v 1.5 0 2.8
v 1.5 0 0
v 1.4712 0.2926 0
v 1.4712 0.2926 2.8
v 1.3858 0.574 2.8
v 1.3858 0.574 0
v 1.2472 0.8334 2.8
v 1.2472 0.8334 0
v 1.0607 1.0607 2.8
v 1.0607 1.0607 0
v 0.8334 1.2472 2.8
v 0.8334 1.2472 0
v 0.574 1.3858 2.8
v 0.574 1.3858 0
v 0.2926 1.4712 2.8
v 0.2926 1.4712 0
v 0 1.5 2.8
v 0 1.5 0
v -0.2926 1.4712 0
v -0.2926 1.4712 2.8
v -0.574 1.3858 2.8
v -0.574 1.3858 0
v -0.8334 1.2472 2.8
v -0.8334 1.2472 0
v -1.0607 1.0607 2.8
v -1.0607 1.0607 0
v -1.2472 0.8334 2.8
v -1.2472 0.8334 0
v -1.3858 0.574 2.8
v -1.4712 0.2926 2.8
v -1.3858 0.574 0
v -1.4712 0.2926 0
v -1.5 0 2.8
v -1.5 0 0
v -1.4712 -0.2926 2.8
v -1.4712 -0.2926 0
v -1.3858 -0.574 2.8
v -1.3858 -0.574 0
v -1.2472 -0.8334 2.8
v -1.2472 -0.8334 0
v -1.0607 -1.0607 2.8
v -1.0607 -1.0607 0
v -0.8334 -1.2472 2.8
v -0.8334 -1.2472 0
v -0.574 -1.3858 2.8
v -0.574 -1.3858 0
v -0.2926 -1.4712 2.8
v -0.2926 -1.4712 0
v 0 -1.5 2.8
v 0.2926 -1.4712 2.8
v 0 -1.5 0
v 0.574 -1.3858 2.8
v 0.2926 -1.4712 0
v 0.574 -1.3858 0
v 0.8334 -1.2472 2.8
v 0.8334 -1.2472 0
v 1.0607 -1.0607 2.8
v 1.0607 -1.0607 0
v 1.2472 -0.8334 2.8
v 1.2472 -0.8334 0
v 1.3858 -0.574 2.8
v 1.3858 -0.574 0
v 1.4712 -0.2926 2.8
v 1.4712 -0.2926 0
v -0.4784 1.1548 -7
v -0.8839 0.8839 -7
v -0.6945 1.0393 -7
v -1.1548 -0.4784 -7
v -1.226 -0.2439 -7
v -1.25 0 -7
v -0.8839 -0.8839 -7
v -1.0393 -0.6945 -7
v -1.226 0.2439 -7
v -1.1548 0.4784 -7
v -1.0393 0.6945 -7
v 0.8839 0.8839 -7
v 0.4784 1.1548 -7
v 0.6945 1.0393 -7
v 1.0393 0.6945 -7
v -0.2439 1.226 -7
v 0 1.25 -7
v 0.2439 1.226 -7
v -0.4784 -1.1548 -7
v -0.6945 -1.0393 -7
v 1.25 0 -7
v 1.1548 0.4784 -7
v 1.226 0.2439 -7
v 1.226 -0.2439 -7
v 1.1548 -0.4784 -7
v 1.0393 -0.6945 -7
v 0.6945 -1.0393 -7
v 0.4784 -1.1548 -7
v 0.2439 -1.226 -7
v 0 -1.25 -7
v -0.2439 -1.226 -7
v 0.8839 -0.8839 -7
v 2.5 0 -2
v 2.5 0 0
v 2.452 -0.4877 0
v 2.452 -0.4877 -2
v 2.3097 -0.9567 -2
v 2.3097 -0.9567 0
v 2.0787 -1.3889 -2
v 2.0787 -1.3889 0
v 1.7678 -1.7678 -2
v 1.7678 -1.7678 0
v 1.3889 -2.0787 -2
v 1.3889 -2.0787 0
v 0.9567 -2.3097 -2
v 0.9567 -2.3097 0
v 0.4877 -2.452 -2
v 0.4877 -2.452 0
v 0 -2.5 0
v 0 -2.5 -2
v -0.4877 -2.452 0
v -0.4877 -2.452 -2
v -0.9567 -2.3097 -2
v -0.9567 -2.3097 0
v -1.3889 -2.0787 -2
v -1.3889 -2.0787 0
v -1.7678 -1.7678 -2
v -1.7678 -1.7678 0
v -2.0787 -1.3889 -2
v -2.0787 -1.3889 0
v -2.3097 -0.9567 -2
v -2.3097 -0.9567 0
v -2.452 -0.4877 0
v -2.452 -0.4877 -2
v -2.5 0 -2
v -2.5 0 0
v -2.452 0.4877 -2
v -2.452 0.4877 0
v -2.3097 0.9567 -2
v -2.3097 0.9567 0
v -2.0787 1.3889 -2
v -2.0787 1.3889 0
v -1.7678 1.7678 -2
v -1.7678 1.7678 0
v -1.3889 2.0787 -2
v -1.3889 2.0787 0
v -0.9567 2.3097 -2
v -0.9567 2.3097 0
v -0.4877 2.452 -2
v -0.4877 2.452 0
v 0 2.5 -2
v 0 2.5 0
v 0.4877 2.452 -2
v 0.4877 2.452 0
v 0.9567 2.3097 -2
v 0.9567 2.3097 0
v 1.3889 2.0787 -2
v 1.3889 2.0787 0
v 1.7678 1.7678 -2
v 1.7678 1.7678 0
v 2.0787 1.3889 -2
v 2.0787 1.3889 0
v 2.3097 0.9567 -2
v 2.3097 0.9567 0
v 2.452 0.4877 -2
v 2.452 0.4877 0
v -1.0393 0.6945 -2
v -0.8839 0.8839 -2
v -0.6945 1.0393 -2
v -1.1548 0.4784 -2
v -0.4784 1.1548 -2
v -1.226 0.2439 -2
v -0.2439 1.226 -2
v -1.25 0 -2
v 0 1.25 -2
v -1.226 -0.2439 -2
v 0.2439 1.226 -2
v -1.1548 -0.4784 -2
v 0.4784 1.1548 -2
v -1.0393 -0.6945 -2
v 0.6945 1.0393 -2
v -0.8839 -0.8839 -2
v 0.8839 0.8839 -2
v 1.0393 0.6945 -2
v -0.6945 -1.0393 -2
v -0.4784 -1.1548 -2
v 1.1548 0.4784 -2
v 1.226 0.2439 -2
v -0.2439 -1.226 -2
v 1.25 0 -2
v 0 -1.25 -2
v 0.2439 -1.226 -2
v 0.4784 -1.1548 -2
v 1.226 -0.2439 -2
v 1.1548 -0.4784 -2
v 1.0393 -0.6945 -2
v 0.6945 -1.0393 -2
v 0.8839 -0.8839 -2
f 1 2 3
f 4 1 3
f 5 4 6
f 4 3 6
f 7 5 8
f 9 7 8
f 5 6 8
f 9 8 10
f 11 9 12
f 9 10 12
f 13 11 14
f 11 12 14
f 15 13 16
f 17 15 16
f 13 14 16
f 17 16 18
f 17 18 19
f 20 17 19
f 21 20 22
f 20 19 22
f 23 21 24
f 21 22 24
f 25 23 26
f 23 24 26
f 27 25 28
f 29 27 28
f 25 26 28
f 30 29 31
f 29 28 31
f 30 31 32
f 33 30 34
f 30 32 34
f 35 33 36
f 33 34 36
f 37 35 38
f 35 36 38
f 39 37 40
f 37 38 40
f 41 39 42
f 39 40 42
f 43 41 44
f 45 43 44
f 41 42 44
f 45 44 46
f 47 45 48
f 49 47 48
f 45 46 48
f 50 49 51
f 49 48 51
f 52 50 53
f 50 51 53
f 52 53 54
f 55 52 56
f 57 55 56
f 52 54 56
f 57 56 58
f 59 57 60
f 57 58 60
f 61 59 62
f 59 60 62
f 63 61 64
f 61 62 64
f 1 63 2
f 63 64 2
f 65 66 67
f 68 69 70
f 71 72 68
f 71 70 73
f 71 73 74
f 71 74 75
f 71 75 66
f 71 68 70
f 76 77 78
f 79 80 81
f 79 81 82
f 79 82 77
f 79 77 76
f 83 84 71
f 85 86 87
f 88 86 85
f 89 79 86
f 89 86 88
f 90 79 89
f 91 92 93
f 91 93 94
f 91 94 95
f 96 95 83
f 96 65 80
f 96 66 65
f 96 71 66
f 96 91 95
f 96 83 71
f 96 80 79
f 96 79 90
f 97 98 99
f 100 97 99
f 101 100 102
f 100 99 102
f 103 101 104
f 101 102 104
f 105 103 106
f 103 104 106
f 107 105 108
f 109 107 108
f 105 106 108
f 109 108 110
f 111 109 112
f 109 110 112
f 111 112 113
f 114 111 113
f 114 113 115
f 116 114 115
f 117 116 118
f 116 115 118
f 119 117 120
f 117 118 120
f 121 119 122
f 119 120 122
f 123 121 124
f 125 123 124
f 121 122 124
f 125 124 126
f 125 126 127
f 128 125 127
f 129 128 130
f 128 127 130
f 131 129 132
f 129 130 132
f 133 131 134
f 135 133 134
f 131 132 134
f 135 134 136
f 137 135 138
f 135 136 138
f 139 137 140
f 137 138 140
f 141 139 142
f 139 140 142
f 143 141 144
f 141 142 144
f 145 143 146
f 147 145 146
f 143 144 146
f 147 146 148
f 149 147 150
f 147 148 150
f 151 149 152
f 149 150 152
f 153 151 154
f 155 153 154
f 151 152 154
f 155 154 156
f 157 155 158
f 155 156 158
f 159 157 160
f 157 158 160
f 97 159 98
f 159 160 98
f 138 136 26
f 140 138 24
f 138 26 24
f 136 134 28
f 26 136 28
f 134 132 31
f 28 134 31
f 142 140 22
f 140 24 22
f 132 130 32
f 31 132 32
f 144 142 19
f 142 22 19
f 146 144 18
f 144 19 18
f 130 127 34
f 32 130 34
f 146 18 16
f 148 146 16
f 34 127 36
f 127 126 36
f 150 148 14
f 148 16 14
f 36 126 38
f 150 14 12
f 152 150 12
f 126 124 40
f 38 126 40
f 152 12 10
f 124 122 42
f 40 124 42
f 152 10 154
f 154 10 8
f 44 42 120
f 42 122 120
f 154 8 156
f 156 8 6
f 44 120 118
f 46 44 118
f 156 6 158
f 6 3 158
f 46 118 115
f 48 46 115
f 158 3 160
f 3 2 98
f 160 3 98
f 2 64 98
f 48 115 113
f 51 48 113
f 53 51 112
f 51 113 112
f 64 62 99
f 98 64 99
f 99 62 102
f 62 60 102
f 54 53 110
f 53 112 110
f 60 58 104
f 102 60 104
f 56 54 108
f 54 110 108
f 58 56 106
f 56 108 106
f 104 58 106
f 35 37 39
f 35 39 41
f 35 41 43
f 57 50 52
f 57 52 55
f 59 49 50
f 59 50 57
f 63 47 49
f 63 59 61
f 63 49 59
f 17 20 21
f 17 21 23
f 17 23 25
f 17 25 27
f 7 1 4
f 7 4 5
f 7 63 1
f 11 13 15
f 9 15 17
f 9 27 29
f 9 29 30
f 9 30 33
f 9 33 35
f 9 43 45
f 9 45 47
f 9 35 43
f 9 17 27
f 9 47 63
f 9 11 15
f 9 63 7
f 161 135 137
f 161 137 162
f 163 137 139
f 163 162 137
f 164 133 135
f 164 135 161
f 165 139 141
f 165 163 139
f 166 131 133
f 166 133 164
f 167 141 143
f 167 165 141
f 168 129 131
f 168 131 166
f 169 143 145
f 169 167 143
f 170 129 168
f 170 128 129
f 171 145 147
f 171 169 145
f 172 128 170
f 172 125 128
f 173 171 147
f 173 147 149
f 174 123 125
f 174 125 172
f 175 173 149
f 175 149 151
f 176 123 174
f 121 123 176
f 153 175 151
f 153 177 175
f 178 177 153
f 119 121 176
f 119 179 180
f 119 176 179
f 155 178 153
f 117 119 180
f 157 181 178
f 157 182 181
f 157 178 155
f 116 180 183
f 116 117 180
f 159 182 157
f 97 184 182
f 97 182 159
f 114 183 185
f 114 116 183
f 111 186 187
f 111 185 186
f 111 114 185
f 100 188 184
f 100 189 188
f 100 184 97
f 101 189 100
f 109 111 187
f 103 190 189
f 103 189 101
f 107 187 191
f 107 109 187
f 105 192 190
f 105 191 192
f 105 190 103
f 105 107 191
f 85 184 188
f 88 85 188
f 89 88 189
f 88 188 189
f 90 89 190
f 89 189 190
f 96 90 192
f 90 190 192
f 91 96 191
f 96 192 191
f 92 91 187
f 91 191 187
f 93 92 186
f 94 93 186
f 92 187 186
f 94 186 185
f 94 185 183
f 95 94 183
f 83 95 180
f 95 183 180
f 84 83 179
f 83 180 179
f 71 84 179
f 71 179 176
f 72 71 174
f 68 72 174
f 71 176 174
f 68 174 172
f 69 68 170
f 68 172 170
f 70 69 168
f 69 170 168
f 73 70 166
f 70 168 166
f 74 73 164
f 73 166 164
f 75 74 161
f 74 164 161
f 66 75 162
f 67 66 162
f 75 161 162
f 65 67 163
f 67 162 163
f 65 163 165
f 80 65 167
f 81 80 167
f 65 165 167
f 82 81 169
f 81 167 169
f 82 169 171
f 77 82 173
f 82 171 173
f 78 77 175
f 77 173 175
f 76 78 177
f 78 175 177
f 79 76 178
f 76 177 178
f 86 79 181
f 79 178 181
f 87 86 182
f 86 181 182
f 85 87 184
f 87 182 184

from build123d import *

# Parameters (mm, degrees)
F0_R     = 1.5
F1_DEPTH = 2.8
F2_R     = 2.5
F2_R_2   = 1.5
F3_DEPTH = 2
F4_R     = 1.25
F5_DEPTH = 5


with BuildPart() as f1:
    # F0 (on Top) → F1 (new body)
    with BuildSketch(Plane.XY):
        Circle(F0_R)
    extrude(amount=F1_DEPTH)

    # F2 (on face) → F3 (join)
    with BuildSketch(Plane(origin=(0, 0, 0), x_dir=(1, 0, 0), z_dir=(0, 0, -1))):
        Circle(F2_R)
        Circle(F2_R_2, mode=Mode.SUBTRACT)
        Circle(F2_R_2)
    extrude(amount=F3_DEPTH)

    # F4 (on face) → F5 (join)
    with BuildSketch(Plane(origin=(0, 0, -2), x_dir=(1, 0, 0), z_dir=(0, 0, -1))):
        Circle(F4_R)
    extrude(amount=F5_DEPTH)


solid = f1.part
